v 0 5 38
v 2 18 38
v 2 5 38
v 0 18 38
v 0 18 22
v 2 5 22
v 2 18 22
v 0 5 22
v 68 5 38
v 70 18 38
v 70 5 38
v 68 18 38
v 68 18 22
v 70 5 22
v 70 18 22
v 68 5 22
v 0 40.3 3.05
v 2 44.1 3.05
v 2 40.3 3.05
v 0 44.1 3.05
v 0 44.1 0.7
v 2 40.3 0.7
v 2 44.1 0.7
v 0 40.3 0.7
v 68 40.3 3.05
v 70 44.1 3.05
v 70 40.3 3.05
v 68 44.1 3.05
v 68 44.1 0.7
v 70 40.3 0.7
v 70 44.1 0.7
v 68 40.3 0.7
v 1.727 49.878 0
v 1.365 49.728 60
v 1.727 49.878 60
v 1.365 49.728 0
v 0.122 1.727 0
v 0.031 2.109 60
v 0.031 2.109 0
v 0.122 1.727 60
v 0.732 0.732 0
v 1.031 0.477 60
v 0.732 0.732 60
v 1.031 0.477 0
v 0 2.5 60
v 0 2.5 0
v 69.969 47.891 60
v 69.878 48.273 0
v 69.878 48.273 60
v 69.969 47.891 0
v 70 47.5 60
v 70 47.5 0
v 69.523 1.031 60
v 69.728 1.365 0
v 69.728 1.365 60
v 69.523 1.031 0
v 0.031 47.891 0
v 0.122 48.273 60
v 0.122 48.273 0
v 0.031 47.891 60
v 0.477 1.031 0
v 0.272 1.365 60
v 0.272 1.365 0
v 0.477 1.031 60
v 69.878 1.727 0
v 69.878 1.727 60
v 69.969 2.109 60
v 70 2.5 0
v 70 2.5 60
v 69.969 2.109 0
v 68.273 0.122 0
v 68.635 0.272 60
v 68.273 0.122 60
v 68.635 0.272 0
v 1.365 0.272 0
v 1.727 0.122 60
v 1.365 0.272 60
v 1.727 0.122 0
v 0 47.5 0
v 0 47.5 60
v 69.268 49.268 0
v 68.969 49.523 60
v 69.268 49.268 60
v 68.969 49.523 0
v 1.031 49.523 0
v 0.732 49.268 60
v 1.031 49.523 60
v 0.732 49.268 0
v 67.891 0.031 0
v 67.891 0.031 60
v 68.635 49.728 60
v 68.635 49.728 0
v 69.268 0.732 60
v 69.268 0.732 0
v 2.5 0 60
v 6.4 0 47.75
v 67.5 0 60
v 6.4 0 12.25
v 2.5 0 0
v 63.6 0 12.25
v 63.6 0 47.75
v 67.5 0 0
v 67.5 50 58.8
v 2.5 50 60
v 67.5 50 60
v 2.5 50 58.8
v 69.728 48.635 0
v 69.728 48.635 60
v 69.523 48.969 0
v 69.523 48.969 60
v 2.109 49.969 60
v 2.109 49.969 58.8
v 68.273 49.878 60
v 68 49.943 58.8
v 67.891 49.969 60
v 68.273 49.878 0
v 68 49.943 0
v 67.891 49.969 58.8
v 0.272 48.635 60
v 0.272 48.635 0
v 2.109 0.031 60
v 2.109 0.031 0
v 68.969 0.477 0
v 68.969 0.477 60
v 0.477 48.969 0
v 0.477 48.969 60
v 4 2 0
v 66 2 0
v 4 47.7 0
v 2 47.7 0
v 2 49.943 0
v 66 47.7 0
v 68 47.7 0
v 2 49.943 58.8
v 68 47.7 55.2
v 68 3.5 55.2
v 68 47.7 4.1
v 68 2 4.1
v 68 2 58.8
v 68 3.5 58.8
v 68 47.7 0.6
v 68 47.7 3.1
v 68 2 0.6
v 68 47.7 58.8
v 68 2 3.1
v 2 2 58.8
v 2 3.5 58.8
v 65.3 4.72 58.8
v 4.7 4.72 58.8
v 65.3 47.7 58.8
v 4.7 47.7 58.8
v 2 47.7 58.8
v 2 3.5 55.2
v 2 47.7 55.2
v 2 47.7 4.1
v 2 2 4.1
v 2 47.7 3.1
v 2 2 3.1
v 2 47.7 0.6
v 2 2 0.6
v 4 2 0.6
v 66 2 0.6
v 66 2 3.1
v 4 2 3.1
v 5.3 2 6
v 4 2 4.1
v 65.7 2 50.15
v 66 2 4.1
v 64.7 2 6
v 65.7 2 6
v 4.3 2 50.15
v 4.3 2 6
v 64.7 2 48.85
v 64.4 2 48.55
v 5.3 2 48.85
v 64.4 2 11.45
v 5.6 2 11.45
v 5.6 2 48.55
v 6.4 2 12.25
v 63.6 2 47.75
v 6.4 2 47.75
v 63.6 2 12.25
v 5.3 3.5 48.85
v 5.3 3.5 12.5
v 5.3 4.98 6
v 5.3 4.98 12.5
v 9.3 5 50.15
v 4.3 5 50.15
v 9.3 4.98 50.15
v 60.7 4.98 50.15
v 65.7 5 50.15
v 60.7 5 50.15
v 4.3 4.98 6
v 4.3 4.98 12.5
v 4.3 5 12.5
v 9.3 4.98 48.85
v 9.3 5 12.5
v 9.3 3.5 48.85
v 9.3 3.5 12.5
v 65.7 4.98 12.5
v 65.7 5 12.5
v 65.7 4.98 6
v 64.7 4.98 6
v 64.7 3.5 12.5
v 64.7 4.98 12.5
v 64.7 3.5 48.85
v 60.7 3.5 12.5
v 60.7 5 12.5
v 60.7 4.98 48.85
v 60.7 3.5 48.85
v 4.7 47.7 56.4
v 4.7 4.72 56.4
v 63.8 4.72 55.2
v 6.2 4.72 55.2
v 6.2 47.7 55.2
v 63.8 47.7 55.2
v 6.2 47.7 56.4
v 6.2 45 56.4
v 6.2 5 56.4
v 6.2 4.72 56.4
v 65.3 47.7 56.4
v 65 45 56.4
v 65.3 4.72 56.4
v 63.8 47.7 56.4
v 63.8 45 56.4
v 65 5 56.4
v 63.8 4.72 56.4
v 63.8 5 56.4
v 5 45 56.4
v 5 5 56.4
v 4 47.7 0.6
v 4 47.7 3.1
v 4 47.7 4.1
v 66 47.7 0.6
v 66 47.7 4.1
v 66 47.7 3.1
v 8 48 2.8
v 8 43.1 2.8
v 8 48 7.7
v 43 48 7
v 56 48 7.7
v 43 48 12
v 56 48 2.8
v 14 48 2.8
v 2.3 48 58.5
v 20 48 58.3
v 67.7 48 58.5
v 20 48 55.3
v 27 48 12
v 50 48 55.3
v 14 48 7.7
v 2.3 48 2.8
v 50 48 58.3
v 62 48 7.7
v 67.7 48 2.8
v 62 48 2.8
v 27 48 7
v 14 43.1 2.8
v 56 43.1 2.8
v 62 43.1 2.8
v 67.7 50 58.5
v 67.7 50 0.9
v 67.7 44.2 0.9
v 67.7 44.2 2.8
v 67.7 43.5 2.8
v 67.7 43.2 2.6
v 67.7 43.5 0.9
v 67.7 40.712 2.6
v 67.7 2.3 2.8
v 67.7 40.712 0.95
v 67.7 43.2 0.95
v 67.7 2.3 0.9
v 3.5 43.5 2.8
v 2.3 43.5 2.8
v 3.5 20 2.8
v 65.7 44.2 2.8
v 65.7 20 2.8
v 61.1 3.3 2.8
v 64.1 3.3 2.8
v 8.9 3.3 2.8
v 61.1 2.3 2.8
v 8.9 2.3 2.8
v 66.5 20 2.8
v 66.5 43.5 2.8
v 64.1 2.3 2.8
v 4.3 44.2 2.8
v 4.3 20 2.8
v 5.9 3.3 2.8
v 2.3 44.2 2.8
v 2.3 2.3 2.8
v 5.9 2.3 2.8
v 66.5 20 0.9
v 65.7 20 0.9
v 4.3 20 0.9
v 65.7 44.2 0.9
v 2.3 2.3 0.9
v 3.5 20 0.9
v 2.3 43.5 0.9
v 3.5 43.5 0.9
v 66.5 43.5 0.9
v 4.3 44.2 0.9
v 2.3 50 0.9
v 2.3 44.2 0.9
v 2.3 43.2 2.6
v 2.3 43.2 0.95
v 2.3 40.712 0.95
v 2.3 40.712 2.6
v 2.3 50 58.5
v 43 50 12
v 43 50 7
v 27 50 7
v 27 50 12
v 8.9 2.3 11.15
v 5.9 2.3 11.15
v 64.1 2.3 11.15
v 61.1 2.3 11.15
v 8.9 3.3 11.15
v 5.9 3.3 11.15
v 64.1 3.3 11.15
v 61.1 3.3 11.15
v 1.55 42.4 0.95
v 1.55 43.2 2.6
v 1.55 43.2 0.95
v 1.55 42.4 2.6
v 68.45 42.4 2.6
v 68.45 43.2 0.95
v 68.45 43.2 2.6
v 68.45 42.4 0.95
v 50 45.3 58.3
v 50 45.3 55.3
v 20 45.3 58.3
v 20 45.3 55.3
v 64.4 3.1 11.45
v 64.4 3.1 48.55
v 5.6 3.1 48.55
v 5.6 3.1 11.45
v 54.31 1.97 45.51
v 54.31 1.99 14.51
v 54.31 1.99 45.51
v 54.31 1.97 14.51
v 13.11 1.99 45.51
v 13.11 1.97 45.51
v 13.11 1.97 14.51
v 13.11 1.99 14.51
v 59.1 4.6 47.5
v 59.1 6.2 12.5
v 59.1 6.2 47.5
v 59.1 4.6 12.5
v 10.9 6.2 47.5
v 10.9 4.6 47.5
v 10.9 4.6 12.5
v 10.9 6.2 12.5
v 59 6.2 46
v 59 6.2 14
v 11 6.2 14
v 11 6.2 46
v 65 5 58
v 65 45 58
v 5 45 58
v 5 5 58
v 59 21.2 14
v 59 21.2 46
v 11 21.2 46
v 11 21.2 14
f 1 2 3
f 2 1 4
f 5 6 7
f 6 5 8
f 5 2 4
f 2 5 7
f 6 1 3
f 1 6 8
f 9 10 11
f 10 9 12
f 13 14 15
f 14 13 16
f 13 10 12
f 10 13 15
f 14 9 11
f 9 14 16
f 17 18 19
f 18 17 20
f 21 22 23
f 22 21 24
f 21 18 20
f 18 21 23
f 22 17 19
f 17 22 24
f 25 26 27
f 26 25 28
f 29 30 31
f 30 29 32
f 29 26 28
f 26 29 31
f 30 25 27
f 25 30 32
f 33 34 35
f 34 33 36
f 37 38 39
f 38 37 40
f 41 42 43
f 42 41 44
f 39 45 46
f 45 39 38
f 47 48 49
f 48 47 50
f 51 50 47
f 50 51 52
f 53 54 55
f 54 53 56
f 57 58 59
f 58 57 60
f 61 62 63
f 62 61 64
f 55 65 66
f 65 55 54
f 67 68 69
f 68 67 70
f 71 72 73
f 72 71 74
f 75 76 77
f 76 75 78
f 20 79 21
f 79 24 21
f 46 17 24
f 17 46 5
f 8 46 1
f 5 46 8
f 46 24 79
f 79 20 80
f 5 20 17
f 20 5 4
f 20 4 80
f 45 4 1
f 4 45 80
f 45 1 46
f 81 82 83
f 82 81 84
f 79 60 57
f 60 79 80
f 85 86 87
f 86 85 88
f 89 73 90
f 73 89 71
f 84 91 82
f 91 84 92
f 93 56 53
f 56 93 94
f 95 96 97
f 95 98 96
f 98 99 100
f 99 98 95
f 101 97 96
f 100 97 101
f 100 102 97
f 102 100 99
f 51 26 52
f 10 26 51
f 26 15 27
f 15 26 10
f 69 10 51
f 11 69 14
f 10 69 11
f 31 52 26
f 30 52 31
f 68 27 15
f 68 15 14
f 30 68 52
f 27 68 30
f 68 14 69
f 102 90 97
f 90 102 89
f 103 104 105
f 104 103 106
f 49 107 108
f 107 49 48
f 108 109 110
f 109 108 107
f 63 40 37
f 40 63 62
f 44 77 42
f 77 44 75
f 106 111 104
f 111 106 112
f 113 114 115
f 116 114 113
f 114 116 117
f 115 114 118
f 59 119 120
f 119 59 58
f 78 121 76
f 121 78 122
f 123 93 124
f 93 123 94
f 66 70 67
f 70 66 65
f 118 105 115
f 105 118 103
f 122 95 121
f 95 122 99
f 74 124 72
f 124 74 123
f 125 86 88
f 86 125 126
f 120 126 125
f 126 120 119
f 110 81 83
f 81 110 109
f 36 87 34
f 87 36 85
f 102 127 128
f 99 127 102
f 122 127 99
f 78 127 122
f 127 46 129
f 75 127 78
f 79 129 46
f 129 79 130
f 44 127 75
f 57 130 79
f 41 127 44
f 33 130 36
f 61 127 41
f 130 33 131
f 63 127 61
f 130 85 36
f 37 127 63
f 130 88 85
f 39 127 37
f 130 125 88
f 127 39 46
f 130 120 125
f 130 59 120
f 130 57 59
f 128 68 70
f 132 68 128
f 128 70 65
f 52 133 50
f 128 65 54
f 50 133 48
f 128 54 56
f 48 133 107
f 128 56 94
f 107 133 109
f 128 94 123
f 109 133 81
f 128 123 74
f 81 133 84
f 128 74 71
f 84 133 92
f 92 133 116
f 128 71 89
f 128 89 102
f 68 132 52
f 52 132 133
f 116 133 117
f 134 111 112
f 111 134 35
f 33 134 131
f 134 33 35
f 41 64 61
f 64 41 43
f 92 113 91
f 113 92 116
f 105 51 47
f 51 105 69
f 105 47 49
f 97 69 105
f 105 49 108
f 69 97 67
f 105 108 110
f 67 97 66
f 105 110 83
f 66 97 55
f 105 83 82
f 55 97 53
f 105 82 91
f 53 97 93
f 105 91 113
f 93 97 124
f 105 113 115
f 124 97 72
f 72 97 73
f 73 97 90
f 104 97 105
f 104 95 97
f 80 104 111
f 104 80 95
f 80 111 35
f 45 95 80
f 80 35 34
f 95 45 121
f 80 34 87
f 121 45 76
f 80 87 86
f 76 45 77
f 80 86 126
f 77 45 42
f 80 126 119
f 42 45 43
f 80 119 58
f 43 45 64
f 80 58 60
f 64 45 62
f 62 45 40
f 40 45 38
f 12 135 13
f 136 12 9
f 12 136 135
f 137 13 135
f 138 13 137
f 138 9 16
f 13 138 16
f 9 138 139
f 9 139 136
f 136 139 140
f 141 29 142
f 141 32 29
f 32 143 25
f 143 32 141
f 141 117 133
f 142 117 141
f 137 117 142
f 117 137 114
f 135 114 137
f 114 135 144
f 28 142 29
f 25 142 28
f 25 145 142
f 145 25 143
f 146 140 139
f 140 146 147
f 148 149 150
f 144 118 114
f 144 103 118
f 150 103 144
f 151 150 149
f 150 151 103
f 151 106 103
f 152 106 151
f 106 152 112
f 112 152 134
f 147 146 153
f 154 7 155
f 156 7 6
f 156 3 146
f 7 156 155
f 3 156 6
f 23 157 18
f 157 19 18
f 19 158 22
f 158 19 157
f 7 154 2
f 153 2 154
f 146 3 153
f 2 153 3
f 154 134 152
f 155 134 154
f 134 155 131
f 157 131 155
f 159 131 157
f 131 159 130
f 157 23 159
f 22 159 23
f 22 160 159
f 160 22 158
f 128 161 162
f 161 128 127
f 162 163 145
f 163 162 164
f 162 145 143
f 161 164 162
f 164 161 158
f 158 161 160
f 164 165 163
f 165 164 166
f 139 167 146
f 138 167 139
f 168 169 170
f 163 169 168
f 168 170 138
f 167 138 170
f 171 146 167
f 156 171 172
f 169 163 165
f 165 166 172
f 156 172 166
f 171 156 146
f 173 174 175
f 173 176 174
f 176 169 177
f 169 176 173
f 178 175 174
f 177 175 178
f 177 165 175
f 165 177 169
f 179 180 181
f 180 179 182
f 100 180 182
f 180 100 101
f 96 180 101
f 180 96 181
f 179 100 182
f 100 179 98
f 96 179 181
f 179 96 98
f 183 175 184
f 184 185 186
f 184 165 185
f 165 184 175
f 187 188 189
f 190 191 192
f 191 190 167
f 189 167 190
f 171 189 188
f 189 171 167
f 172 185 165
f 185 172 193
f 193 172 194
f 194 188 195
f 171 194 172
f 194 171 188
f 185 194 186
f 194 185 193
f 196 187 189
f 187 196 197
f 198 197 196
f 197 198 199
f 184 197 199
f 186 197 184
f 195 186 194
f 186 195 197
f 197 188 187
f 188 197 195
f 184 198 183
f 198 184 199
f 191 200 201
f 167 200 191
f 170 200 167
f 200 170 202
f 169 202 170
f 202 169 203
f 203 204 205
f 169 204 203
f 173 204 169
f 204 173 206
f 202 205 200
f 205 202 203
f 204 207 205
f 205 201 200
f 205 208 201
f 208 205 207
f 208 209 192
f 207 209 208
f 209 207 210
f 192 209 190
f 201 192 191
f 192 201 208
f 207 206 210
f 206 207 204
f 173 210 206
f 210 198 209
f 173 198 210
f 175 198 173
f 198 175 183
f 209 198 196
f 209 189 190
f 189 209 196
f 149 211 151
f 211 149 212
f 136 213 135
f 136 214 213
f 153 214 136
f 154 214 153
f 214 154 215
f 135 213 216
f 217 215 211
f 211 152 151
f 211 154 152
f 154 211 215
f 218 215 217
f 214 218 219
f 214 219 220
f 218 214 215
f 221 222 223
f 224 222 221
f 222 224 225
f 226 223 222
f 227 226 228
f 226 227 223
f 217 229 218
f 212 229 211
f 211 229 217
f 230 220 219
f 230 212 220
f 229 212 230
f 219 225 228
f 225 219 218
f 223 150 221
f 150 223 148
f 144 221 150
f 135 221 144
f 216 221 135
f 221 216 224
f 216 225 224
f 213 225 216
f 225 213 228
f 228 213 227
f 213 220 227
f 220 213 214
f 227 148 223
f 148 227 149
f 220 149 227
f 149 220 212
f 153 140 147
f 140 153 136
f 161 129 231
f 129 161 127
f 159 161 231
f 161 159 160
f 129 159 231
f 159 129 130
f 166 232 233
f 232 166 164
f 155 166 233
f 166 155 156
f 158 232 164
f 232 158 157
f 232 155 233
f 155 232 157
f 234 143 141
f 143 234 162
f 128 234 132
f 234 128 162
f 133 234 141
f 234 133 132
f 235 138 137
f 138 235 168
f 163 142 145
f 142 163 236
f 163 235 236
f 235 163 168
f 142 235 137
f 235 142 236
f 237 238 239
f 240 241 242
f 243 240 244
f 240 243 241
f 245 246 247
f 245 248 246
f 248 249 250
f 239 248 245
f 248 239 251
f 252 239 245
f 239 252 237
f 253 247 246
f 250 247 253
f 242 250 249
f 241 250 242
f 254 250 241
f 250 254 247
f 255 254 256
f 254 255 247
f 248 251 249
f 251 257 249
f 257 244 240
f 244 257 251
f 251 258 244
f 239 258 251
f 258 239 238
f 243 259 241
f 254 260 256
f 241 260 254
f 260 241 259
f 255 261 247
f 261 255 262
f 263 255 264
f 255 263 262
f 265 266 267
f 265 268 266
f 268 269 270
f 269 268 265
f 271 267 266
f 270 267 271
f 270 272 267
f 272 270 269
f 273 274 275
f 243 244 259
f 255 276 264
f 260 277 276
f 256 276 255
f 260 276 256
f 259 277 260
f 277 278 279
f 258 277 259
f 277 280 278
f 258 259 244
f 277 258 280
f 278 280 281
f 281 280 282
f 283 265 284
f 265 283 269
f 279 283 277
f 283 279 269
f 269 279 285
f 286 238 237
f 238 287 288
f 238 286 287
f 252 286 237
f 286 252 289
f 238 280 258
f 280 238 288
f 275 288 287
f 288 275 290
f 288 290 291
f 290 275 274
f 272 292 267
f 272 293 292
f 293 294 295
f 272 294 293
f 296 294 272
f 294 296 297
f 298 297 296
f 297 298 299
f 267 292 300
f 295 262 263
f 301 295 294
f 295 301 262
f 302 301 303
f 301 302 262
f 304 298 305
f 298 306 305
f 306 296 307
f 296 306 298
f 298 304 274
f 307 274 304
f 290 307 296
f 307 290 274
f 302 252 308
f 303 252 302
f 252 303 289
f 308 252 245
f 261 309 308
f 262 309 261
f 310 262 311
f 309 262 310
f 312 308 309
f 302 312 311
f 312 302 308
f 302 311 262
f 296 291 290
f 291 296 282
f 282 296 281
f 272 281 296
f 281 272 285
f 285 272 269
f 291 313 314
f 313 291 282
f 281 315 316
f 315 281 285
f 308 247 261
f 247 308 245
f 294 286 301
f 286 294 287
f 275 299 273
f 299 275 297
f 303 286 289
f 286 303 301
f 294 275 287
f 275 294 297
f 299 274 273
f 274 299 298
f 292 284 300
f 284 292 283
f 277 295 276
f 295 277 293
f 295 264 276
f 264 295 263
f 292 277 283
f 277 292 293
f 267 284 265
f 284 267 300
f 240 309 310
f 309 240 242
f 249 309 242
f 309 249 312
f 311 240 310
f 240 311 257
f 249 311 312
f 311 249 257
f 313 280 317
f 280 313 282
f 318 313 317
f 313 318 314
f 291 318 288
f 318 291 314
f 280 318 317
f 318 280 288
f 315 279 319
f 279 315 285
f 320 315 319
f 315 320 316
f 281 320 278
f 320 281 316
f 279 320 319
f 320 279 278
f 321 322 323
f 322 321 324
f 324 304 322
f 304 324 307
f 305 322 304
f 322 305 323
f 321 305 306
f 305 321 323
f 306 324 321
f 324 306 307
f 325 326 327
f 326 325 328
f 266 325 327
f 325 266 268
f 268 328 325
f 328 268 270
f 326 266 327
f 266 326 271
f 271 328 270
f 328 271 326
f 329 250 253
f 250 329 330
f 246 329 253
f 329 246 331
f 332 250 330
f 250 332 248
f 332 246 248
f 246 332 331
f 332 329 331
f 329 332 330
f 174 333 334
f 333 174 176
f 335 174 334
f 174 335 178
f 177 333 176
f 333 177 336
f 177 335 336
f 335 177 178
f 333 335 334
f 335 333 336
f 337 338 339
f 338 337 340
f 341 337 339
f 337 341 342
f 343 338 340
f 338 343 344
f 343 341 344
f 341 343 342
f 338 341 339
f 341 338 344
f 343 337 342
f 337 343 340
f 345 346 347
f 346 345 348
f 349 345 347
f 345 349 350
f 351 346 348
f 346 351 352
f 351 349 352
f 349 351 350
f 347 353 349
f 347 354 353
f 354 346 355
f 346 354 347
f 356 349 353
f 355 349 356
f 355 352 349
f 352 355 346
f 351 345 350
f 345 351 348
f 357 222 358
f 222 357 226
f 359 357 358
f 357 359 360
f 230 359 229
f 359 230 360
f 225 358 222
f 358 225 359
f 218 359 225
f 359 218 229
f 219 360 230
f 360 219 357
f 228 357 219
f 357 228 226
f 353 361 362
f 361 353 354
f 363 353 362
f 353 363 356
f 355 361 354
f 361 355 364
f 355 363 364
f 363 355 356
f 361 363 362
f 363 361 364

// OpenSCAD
// NFC jukebox enclosure r0 - millimetres.
// Source: Waveshare ESP32-S3-Touch-LCD-2 dimension drawing.
// RC522 nominal 60x40 PCB; actual thickness/component keepouts need fit check.
// Coordinates: X width, Y front->rear, Z height. Front is Y=0.
// Use: openscad -D 'part="body"' -o body.stl jukebox.scad
part = "assembly"; // body, drawer, assembly, exploded, interference
$fn = 40;
W=70; D=50; H=60;
wall=2;
glass_w=58.8; glass_h=37.1; glass_t=1.1;
glass_x=(W-glass_w)/2; glass_z=(H-glass_h)/2;
glass_y=wall;
glass_gap=0.4;
rail_rear=glass_y+glass_t+glass_gap;
rc_w=60; rc_d=40; rc_t=1.6;
rc_x=(W-rc_w)/2; rc_y=(D-rc_d)/2;
rc_z=56.4;
clearance=0.3;
eps=0.02;

module box(x,y,z,dx,dy,dz){translate([x,y,z])cube([dx,dy,dz]);}

module shell(){
  difference(){
    linear_extrude(height=H)hull()
      for(x=[2.5,W-2.5],y=[2.5,D-2.5])translate([x,y])circle(r=2.5);
    // Open bottom and rear, roof 1.2 mm. Side/front walls 2 mm.
    box(wall,wall,-eps,W-2*wall,D,H-1.2+eps);
    // Front bezel overlaps glass by 0.8 mm each edge.
    box(glass_x+0.8,-eps,glass_z+0.8,glass_w-1.6,wall+2*eps,glass_h-1.6);
    // Side service windows accommodate either mirrored USB orientation.
    for(x=[-eps,W-wall-eps]) box(x,5,22,wall+2*eps,13,16);
    // Release openings for the two drawer detents, accessible from outside.
    for(x=[-eps,W-wall-eps]) box(x,40.3,0.7,wall+2*eps,3.8,2.35);
  }
}

module display_guides(){
  // Retain only glass margins: rear PCB is narrower and stays unobstructed.
  for(right=[false,true]){
    x=right ? glass_x+glass_w+clearance : glass_x-clearance-1;
    box(x,wall-eps,6,1,3.0,H/2+glass_h/2+clearance-6+1.3);
    xr=right ? glass_x+glass_w-3.7 : glass_x-clearance-1;
    // Bottom clearance lets drawer support fingers slide underneath the rails.
    box(xr,rail_rear,glass_z+1.05,5,1.5,glass_h+clearance+1.3-1.05);
  }
  // Upper stop contacts the outer glass edge, not active LCD.
  box(glass_x-clearance,wall-eps,glass_z+glass_h+clearance,
      glass_w+2*clearance,rail_rear-wall+1.5,1.3);
}

module rfid_guides(){
  // Board slides in from the open rear, antenna side up, solder joints down.
  // 2.4-mm channel for nominal 1.6-mm PCB. No metal or supports under antenna.
  for(right=[false,true]){
    x=right ? rc_x+rc_w+clearance : wall-eps;
    width=right ? W-wall-x+eps : rc_x-clearance-wall+eps;
    box(x,rc_y-clearance,55.2,width,D-wall-clearance-(rc_y-clearance),H-1.2-55.2+eps);
    ledge_x=right ? rc_x+rc_w-1.2 : wall-eps;
    ledge_w=right ? W-wall-ledge_x+eps : rc_x+1.2-wall+eps;
    box(ledge_x,rc_y-clearance,55.2,ledge_w,D-wall-clearance-(rc_y-clearance),1.2);
  }
  box(wall-eps,rc_y-clearance-1.2,55.2,W-2*wall+2*eps,1.2+eps,H-1.2-55.2+eps);
}

module floor_guides(){
  for(right=[false,true]){
    x=right ? W-wall-2 : wall-eps;
    box(x,wall-eps,0,2+eps,D-2*wall-clearance+eps,0.6);
    box(x,wall-eps,3.1,2+eps,D-2*wall-clearance+eps,1.0);
  }
}

module body(){union(){shell();display_guides();rfid_guides();floor_guides();}}

module tooth_left(){
  // 0.45 mm engagement, 24-mm flexible PLA arm, ramp during insertion.
  translate([0,0,0.95])linear_extrude(height=1.65)
    polygon([[2.35,40.6],[1.55,42.4],[1.55,43.2],[2.35,43.2]]);
}

module drawer(){
  union(){
    difference(){
      union(){
        box(2.3,2.3,0.9,W-4.6,D-2.3,1.9);
        box(2.3,48,0.9,W-4.6,2,57.6);
        // Inner corner fillet substitute: 45-degree triangular gussets.
        for(x=[8,56])translate([x,48,2.7])rotate([90,0,90])
          linear_extrude(height=6)polygon([[0,0],[-5,0],[0,5]]);
      }
      // Free a long cantilever on each side, rooted at Y=20.
      box(3.5,20,0.8,0.8,24.2,2.2);
      box(2.1,43.5,0.8,2.2,0.7,2.2);
      box(W-4.3,20,0.8,0.8,24.2,2.2);
      box(W-4.3,43.5,0.8,2.2,0.7,2.2);
      // Grip opening in rear, also serves as ventilation opening.
      box(27,47.9,7,16,2.2,5);
    }
    tooth_left();translate([W,0,0])mirror([1,0,0])tooth_left();
    // Drawer supports display glass vertically, with 0.3 mm end clearance.
    for(x=[glass_x+0.3,glass_x+glass_w-3.3])
      box(x,2.3,2.7,3,1.0,glass_z-clearance-2.7);
    // Rear board stop: only its end face, no pressure on PCB surfaces.
    box(20,rc_y+rc_d+clearance,55.3,30,48-(rc_y+rc_d+clearance)+eps,3.0);
  }
}

module hardware(){
  color([0.12,0.16,0.19])box(glass_x,glass_y,glass_z,glass_w,glass_t,glass_h);
  color([0.08,0.65,0.64])box(glass_x+7.51,glass_y-0.03,glass_z+3.06,41.2,0.02,31);
  // PCB envelope; actual connector positions are deliberately not asserted.
  color([0.1,0.3,0.6])box((W-48.2)/2,glass_y+glass_t+1.5,(H-35)/2,48.2,1.6,35);
  color([0.08,0.35,0.62])box(rc_x,rc_y,rc_z,rc_w,rc_d,rc_t);
  // Approximate rear electronics keepout, for illustration only.
  color([0.55,0.55,0.55,0.3])box(11,6.2,14,48,15,32);
}

if(part=="body") translate([0,D,H])rotate([180,0,0])body();
else if(part=="drawer")translate([0,0,-0.9])drawer();
else if(part=="interference")intersection(){body();drawer();}
else if(part=="travel_check")intersection(){
  body();
  union()for(dy=[0:0.5:50])translate([0,dy,0])difference(){
    drawer();
    // The flexible detents intentionally interfere while the drawer slides.
    box(0,39,0,2.3,6,4);box(W-2.3,39,0,2.3,6,4);
  }
}
else if(part=="exploded"){
  color([0.76,0.80,0.83,0.5])body();hardware();
  color([0.94,0.55,0.22])translate([0,35,-10])drawer();
} else {
  color([0.76,0.80,0.83,0.65])body();
  color([0.3,0.36,0.42])drawer();hardware();
}
